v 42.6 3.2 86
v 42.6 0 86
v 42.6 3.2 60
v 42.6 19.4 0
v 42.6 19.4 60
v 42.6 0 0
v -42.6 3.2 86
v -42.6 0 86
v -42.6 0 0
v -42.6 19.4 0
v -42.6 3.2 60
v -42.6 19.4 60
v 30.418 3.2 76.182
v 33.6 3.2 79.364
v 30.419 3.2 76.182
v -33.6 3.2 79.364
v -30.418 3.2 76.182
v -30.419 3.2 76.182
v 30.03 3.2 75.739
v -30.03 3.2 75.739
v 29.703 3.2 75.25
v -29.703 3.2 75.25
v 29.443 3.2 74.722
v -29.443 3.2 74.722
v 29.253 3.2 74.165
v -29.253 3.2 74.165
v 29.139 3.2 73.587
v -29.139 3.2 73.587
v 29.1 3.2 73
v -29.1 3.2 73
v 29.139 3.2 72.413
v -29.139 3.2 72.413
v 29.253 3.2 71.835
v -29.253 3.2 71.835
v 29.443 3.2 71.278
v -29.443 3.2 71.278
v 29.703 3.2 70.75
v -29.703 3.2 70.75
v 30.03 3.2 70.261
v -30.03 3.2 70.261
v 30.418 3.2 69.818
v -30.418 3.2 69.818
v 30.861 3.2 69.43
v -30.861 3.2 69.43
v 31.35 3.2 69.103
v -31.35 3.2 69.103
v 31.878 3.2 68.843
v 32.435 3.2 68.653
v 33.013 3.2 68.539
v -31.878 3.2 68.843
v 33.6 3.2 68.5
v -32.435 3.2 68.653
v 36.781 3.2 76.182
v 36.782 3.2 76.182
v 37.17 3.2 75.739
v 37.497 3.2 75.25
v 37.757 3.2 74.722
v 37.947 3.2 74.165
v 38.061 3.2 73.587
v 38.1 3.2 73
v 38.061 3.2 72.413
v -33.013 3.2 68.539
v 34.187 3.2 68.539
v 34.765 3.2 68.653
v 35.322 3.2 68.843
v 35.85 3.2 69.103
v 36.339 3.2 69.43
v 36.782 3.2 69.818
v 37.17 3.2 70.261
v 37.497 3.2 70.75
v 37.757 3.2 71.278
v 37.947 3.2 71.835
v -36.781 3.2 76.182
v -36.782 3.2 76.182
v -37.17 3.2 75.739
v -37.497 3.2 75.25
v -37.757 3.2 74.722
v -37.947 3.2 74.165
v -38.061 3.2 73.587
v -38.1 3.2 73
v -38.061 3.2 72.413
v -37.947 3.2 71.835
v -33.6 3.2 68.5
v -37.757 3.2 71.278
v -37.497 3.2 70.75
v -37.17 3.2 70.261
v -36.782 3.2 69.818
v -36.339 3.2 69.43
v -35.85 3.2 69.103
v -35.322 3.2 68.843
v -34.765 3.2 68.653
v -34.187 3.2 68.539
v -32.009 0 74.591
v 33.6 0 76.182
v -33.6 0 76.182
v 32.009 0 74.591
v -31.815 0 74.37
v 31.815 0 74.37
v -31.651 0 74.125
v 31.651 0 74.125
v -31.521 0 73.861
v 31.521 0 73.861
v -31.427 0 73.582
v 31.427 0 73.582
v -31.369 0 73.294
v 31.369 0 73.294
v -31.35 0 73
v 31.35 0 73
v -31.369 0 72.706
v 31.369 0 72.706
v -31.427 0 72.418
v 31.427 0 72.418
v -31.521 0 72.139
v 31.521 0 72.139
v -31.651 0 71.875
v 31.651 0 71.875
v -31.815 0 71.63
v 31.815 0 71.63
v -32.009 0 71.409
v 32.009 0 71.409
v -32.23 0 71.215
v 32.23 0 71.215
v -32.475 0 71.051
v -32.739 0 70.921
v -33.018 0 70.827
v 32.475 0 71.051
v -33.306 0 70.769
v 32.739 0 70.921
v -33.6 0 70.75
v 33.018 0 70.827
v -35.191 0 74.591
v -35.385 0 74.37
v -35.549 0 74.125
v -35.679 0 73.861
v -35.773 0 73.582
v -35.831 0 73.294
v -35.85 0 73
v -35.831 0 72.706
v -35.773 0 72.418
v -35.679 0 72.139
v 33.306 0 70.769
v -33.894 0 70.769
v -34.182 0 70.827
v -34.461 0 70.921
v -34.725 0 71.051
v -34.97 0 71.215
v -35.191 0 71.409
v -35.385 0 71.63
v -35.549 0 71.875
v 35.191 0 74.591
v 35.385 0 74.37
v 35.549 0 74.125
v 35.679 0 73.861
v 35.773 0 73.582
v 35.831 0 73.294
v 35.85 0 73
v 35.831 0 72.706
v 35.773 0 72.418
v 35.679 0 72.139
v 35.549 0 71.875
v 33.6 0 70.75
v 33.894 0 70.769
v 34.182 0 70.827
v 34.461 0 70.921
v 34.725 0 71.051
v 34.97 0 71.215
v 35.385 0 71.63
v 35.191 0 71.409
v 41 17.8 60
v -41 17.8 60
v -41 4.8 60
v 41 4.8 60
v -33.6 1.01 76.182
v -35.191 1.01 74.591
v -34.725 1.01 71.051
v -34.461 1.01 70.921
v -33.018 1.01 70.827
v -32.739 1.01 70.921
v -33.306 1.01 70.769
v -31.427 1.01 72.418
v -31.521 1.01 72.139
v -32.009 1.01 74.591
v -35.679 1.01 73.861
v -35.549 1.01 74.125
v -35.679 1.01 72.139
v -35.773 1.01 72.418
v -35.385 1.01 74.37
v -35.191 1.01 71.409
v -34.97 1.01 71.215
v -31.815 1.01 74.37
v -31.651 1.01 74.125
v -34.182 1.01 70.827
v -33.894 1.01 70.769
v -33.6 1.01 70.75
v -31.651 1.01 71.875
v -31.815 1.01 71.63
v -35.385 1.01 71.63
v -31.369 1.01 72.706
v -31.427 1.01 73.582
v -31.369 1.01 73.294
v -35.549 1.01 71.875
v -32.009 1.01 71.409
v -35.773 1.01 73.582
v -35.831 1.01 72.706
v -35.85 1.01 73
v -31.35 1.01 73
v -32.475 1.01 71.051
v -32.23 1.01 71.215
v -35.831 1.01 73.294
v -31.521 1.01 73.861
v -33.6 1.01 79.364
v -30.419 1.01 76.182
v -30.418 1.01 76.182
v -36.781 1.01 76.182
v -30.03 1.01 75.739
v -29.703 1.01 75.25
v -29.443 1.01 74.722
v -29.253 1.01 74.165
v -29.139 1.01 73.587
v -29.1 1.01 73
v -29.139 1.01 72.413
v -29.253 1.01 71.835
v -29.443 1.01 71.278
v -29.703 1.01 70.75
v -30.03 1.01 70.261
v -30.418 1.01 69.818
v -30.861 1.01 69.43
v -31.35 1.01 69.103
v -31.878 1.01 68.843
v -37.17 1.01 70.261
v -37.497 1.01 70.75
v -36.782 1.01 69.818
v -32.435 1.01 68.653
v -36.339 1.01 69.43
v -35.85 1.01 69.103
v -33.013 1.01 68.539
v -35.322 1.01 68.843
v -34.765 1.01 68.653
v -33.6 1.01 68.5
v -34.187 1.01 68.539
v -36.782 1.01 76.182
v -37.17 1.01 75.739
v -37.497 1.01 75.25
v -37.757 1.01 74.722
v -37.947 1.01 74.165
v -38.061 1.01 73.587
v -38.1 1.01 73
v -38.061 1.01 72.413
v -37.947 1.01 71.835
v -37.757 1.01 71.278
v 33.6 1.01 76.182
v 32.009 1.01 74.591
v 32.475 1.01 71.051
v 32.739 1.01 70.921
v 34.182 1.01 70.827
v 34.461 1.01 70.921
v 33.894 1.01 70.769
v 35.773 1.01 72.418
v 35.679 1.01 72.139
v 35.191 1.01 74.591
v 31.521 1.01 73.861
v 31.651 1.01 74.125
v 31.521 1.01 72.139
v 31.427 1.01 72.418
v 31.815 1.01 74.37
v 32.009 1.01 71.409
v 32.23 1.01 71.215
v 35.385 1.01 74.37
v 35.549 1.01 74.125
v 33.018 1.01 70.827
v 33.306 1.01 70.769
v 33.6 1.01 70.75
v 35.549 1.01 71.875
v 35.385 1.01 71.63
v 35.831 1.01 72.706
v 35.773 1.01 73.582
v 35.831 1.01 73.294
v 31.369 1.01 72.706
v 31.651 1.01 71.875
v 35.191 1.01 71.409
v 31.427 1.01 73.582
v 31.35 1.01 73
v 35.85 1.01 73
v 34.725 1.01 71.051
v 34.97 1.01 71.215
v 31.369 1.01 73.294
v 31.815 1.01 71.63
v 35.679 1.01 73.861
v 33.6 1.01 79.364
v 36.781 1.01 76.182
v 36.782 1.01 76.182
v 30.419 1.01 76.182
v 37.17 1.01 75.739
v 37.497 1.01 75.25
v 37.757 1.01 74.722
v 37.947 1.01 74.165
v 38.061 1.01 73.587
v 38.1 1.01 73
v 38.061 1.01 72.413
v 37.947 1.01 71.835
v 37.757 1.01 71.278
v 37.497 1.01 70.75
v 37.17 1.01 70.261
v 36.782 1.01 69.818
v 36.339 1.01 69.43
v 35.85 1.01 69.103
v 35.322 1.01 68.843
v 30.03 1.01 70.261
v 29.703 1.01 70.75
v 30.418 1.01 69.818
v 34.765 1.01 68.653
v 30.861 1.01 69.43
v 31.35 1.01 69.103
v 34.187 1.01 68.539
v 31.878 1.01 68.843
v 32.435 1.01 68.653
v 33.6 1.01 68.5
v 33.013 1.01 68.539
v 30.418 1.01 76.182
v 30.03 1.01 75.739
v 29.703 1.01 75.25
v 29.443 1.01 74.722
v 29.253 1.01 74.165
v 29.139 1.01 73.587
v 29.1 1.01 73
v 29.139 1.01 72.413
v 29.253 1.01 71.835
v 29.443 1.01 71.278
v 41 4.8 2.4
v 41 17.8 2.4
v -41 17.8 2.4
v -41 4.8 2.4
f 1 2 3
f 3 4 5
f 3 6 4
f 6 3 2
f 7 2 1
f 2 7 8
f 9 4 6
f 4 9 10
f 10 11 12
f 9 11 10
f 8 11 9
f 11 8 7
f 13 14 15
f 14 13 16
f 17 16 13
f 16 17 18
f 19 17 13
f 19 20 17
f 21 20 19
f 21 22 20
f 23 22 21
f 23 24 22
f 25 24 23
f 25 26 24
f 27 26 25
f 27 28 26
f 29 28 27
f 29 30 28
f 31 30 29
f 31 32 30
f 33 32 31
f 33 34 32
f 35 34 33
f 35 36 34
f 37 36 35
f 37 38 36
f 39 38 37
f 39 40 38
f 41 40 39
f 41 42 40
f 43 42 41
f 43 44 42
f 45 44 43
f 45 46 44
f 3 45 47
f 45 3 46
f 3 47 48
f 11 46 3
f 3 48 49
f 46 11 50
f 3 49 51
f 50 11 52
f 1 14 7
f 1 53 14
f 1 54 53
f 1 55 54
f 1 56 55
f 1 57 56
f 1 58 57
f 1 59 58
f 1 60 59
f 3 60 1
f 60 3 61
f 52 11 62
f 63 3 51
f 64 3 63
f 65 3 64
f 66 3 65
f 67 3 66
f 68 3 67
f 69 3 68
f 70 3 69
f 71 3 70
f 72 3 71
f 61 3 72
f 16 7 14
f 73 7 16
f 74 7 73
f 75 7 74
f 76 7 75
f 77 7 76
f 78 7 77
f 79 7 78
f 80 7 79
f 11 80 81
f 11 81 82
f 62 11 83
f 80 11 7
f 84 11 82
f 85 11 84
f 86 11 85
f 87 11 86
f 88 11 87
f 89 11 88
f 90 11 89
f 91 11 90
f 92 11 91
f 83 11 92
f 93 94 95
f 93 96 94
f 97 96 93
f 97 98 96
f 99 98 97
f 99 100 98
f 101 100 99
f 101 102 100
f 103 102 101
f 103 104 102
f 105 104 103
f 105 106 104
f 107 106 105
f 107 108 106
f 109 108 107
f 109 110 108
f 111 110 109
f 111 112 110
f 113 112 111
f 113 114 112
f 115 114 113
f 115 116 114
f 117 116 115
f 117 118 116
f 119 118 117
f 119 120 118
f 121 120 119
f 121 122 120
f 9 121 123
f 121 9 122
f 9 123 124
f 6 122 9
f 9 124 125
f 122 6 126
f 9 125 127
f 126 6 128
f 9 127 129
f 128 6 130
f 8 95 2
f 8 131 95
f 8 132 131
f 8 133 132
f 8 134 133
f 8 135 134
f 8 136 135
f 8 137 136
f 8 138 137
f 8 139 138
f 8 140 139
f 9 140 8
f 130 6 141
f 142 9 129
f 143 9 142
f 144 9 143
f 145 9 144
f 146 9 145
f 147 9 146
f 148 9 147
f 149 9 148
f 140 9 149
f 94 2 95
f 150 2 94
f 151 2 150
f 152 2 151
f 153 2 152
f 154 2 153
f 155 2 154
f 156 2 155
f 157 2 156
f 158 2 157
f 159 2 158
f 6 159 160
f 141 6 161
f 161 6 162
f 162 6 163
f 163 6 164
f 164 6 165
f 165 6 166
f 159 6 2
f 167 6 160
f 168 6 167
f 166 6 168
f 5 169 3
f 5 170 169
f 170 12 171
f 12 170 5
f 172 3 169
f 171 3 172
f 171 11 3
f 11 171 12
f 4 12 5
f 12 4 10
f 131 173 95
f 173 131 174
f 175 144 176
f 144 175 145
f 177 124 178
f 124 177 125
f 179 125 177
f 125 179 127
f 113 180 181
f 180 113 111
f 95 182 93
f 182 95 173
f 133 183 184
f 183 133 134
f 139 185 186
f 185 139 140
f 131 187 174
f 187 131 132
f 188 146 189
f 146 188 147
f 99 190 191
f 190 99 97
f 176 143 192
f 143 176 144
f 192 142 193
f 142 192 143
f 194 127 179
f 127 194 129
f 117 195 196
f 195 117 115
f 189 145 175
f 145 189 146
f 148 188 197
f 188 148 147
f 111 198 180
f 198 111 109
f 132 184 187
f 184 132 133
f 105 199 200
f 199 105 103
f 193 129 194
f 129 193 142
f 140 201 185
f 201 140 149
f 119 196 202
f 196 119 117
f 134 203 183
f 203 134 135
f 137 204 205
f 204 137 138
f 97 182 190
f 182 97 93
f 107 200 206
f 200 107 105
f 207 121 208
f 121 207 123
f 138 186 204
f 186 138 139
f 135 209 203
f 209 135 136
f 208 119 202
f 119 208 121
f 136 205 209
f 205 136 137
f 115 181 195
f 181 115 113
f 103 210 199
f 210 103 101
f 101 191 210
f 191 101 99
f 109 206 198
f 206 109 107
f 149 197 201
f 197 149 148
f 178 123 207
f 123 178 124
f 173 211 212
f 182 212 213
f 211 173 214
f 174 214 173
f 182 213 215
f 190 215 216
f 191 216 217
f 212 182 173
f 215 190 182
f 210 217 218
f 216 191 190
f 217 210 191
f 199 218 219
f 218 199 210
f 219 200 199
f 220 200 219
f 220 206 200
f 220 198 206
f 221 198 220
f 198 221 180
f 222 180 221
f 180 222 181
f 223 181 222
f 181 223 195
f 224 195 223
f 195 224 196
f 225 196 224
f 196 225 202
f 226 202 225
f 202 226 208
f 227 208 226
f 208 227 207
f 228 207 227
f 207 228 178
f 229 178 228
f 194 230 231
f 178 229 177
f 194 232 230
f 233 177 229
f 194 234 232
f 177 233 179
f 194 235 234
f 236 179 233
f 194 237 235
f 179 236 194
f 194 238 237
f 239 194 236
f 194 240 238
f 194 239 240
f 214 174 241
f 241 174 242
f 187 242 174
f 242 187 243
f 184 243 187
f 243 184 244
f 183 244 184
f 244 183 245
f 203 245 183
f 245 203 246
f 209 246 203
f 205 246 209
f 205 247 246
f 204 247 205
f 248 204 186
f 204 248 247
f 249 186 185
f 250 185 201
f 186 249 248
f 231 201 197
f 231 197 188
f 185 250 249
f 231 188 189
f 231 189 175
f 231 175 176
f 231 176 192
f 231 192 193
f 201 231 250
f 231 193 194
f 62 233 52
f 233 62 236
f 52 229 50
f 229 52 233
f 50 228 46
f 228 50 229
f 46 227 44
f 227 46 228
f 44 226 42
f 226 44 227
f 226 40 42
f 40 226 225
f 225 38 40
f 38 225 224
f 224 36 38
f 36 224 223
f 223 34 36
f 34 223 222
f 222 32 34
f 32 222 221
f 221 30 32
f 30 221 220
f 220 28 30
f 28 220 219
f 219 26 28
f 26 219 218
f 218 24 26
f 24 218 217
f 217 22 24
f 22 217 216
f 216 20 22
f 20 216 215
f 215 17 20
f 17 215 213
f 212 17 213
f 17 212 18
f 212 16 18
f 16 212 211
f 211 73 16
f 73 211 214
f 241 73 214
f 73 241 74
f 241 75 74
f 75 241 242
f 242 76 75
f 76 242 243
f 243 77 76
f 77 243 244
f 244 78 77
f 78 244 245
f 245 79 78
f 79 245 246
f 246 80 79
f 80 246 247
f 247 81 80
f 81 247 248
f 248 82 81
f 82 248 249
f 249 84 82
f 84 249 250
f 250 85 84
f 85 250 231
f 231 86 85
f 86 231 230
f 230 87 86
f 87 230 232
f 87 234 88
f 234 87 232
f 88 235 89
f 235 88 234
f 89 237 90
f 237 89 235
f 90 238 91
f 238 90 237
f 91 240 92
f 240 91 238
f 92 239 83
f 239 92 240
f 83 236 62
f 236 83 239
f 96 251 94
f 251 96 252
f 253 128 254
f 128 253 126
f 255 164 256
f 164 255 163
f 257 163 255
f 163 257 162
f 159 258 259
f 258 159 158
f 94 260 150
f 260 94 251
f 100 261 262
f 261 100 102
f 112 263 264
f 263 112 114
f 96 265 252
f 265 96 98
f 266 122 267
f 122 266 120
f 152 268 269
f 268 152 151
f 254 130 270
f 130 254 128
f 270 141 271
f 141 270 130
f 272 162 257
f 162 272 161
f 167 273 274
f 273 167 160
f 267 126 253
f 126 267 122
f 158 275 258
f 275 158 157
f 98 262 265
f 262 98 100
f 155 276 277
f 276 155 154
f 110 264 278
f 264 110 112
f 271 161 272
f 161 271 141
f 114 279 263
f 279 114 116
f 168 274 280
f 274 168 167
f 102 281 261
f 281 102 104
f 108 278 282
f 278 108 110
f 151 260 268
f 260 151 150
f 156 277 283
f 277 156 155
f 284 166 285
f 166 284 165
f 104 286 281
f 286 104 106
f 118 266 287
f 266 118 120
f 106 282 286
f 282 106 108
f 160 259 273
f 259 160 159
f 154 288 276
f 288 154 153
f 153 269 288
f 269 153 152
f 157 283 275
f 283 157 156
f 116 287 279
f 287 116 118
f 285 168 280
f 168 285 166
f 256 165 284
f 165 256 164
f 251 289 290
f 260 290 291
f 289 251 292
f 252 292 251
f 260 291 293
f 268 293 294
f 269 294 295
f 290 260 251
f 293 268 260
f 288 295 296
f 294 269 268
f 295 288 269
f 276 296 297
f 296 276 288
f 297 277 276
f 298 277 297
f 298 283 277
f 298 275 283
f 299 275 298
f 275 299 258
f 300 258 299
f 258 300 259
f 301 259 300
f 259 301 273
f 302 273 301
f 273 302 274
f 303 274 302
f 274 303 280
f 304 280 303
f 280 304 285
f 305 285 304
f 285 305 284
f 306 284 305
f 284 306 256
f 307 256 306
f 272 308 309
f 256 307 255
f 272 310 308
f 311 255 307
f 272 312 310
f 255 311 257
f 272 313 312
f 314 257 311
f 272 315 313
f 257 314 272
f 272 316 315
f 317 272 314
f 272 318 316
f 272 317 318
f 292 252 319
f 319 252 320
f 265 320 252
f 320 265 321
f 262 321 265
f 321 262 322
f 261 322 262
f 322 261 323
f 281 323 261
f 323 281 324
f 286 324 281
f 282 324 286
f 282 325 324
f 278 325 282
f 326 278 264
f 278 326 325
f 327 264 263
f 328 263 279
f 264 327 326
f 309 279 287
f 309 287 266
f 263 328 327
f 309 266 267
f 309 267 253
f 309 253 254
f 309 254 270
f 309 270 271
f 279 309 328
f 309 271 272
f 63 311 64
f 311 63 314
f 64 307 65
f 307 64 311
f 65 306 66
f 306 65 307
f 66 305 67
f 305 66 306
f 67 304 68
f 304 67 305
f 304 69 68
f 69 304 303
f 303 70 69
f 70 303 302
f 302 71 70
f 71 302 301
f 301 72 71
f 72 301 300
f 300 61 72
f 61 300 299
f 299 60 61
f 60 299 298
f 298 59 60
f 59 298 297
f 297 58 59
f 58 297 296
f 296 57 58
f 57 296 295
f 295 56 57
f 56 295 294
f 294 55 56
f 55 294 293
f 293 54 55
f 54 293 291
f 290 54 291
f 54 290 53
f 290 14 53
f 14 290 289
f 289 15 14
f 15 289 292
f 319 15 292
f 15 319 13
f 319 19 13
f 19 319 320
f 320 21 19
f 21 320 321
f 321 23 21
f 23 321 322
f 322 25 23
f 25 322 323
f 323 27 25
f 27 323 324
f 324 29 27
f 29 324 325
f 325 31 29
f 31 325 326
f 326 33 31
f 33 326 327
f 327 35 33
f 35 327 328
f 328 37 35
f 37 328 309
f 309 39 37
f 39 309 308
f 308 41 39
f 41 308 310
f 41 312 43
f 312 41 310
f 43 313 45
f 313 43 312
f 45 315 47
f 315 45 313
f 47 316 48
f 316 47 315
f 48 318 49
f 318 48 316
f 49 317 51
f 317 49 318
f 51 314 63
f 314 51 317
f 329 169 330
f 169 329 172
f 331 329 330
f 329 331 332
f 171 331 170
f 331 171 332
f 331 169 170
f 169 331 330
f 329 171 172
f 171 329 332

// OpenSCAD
// Desk-side pocket organizer: adhesive-tape or screw mount, pocket open at the top - original design (Brian Sacco)
// Prints standing: the pocket floor sits on the bed and the mounting plate rises vertically. No overhangs, no supports.
pocket_w = 82;     // inner width of the pocket along the desk (mm)
pocket_d = 13;     // inner depth, away from the desk: 13 = phone + normal case, 18 = rugged case
pocket_h = 60;     // pocket wall height
wall     = 1.6;
floor_t  = 2.4;
plate_t  = 3.2;    // mounting plate thickness
screw_d  = 4.5;    // screw clearance hole (for a 4 mm wood or drywall screw)
$fn = 48;

w_out  = pocket_w + 2 * wall;
d_out  = pocket_d + 2 * wall;
plate_h = pocket_h + 26;          // 26 mm of plate above the pocket for the two screws
hole_z  = pocket_h + 13;
hole_x  = w_out / 2 - 9;

module tear(d) {   // circle with a 45 degree pointed top
    circle(d = d);
    polygon([[-d / 2 * 0.7071, d / 2 * 0.7071], [0, d / 2 * 1.4142], [d / 2 * 0.7071, d / 2 * 0.7071]]);
}

difference() {
    union() {
        // mounting plate (the rear face is flat for adhesive foam tape, y = 0)
        translate([-w_out / 2, 0, 0]) cube([w_out, plate_t, plate_h]);
        // pocket
        translate([-w_out / 2, plate_t - 0.01, 0]) cube([w_out, d_out + 0.01, pocket_h]);
    }
    // pocket cavity
    translate([-pocket_w / 2, plate_t + wall, floor_t]) cube([pocket_w, pocket_d, pocket_h]);
    // two screw holes with a counterbore for the head; teardrop shaped (pointed top at 45 degrees) so no supports
    for (s = [-1, 1]) {
        translate([s * hole_x, plate_t + 1, hole_z]) rotate([90, 0, 0]) linear_extrude(plate_t + 2) tear(screw_d);
        translate([s * hole_x, plate_t + 0.01, hole_z]) rotate([90, 0, 0]) linear_extrude(2.2) tear(screw_d + 4.5);
    }
}
